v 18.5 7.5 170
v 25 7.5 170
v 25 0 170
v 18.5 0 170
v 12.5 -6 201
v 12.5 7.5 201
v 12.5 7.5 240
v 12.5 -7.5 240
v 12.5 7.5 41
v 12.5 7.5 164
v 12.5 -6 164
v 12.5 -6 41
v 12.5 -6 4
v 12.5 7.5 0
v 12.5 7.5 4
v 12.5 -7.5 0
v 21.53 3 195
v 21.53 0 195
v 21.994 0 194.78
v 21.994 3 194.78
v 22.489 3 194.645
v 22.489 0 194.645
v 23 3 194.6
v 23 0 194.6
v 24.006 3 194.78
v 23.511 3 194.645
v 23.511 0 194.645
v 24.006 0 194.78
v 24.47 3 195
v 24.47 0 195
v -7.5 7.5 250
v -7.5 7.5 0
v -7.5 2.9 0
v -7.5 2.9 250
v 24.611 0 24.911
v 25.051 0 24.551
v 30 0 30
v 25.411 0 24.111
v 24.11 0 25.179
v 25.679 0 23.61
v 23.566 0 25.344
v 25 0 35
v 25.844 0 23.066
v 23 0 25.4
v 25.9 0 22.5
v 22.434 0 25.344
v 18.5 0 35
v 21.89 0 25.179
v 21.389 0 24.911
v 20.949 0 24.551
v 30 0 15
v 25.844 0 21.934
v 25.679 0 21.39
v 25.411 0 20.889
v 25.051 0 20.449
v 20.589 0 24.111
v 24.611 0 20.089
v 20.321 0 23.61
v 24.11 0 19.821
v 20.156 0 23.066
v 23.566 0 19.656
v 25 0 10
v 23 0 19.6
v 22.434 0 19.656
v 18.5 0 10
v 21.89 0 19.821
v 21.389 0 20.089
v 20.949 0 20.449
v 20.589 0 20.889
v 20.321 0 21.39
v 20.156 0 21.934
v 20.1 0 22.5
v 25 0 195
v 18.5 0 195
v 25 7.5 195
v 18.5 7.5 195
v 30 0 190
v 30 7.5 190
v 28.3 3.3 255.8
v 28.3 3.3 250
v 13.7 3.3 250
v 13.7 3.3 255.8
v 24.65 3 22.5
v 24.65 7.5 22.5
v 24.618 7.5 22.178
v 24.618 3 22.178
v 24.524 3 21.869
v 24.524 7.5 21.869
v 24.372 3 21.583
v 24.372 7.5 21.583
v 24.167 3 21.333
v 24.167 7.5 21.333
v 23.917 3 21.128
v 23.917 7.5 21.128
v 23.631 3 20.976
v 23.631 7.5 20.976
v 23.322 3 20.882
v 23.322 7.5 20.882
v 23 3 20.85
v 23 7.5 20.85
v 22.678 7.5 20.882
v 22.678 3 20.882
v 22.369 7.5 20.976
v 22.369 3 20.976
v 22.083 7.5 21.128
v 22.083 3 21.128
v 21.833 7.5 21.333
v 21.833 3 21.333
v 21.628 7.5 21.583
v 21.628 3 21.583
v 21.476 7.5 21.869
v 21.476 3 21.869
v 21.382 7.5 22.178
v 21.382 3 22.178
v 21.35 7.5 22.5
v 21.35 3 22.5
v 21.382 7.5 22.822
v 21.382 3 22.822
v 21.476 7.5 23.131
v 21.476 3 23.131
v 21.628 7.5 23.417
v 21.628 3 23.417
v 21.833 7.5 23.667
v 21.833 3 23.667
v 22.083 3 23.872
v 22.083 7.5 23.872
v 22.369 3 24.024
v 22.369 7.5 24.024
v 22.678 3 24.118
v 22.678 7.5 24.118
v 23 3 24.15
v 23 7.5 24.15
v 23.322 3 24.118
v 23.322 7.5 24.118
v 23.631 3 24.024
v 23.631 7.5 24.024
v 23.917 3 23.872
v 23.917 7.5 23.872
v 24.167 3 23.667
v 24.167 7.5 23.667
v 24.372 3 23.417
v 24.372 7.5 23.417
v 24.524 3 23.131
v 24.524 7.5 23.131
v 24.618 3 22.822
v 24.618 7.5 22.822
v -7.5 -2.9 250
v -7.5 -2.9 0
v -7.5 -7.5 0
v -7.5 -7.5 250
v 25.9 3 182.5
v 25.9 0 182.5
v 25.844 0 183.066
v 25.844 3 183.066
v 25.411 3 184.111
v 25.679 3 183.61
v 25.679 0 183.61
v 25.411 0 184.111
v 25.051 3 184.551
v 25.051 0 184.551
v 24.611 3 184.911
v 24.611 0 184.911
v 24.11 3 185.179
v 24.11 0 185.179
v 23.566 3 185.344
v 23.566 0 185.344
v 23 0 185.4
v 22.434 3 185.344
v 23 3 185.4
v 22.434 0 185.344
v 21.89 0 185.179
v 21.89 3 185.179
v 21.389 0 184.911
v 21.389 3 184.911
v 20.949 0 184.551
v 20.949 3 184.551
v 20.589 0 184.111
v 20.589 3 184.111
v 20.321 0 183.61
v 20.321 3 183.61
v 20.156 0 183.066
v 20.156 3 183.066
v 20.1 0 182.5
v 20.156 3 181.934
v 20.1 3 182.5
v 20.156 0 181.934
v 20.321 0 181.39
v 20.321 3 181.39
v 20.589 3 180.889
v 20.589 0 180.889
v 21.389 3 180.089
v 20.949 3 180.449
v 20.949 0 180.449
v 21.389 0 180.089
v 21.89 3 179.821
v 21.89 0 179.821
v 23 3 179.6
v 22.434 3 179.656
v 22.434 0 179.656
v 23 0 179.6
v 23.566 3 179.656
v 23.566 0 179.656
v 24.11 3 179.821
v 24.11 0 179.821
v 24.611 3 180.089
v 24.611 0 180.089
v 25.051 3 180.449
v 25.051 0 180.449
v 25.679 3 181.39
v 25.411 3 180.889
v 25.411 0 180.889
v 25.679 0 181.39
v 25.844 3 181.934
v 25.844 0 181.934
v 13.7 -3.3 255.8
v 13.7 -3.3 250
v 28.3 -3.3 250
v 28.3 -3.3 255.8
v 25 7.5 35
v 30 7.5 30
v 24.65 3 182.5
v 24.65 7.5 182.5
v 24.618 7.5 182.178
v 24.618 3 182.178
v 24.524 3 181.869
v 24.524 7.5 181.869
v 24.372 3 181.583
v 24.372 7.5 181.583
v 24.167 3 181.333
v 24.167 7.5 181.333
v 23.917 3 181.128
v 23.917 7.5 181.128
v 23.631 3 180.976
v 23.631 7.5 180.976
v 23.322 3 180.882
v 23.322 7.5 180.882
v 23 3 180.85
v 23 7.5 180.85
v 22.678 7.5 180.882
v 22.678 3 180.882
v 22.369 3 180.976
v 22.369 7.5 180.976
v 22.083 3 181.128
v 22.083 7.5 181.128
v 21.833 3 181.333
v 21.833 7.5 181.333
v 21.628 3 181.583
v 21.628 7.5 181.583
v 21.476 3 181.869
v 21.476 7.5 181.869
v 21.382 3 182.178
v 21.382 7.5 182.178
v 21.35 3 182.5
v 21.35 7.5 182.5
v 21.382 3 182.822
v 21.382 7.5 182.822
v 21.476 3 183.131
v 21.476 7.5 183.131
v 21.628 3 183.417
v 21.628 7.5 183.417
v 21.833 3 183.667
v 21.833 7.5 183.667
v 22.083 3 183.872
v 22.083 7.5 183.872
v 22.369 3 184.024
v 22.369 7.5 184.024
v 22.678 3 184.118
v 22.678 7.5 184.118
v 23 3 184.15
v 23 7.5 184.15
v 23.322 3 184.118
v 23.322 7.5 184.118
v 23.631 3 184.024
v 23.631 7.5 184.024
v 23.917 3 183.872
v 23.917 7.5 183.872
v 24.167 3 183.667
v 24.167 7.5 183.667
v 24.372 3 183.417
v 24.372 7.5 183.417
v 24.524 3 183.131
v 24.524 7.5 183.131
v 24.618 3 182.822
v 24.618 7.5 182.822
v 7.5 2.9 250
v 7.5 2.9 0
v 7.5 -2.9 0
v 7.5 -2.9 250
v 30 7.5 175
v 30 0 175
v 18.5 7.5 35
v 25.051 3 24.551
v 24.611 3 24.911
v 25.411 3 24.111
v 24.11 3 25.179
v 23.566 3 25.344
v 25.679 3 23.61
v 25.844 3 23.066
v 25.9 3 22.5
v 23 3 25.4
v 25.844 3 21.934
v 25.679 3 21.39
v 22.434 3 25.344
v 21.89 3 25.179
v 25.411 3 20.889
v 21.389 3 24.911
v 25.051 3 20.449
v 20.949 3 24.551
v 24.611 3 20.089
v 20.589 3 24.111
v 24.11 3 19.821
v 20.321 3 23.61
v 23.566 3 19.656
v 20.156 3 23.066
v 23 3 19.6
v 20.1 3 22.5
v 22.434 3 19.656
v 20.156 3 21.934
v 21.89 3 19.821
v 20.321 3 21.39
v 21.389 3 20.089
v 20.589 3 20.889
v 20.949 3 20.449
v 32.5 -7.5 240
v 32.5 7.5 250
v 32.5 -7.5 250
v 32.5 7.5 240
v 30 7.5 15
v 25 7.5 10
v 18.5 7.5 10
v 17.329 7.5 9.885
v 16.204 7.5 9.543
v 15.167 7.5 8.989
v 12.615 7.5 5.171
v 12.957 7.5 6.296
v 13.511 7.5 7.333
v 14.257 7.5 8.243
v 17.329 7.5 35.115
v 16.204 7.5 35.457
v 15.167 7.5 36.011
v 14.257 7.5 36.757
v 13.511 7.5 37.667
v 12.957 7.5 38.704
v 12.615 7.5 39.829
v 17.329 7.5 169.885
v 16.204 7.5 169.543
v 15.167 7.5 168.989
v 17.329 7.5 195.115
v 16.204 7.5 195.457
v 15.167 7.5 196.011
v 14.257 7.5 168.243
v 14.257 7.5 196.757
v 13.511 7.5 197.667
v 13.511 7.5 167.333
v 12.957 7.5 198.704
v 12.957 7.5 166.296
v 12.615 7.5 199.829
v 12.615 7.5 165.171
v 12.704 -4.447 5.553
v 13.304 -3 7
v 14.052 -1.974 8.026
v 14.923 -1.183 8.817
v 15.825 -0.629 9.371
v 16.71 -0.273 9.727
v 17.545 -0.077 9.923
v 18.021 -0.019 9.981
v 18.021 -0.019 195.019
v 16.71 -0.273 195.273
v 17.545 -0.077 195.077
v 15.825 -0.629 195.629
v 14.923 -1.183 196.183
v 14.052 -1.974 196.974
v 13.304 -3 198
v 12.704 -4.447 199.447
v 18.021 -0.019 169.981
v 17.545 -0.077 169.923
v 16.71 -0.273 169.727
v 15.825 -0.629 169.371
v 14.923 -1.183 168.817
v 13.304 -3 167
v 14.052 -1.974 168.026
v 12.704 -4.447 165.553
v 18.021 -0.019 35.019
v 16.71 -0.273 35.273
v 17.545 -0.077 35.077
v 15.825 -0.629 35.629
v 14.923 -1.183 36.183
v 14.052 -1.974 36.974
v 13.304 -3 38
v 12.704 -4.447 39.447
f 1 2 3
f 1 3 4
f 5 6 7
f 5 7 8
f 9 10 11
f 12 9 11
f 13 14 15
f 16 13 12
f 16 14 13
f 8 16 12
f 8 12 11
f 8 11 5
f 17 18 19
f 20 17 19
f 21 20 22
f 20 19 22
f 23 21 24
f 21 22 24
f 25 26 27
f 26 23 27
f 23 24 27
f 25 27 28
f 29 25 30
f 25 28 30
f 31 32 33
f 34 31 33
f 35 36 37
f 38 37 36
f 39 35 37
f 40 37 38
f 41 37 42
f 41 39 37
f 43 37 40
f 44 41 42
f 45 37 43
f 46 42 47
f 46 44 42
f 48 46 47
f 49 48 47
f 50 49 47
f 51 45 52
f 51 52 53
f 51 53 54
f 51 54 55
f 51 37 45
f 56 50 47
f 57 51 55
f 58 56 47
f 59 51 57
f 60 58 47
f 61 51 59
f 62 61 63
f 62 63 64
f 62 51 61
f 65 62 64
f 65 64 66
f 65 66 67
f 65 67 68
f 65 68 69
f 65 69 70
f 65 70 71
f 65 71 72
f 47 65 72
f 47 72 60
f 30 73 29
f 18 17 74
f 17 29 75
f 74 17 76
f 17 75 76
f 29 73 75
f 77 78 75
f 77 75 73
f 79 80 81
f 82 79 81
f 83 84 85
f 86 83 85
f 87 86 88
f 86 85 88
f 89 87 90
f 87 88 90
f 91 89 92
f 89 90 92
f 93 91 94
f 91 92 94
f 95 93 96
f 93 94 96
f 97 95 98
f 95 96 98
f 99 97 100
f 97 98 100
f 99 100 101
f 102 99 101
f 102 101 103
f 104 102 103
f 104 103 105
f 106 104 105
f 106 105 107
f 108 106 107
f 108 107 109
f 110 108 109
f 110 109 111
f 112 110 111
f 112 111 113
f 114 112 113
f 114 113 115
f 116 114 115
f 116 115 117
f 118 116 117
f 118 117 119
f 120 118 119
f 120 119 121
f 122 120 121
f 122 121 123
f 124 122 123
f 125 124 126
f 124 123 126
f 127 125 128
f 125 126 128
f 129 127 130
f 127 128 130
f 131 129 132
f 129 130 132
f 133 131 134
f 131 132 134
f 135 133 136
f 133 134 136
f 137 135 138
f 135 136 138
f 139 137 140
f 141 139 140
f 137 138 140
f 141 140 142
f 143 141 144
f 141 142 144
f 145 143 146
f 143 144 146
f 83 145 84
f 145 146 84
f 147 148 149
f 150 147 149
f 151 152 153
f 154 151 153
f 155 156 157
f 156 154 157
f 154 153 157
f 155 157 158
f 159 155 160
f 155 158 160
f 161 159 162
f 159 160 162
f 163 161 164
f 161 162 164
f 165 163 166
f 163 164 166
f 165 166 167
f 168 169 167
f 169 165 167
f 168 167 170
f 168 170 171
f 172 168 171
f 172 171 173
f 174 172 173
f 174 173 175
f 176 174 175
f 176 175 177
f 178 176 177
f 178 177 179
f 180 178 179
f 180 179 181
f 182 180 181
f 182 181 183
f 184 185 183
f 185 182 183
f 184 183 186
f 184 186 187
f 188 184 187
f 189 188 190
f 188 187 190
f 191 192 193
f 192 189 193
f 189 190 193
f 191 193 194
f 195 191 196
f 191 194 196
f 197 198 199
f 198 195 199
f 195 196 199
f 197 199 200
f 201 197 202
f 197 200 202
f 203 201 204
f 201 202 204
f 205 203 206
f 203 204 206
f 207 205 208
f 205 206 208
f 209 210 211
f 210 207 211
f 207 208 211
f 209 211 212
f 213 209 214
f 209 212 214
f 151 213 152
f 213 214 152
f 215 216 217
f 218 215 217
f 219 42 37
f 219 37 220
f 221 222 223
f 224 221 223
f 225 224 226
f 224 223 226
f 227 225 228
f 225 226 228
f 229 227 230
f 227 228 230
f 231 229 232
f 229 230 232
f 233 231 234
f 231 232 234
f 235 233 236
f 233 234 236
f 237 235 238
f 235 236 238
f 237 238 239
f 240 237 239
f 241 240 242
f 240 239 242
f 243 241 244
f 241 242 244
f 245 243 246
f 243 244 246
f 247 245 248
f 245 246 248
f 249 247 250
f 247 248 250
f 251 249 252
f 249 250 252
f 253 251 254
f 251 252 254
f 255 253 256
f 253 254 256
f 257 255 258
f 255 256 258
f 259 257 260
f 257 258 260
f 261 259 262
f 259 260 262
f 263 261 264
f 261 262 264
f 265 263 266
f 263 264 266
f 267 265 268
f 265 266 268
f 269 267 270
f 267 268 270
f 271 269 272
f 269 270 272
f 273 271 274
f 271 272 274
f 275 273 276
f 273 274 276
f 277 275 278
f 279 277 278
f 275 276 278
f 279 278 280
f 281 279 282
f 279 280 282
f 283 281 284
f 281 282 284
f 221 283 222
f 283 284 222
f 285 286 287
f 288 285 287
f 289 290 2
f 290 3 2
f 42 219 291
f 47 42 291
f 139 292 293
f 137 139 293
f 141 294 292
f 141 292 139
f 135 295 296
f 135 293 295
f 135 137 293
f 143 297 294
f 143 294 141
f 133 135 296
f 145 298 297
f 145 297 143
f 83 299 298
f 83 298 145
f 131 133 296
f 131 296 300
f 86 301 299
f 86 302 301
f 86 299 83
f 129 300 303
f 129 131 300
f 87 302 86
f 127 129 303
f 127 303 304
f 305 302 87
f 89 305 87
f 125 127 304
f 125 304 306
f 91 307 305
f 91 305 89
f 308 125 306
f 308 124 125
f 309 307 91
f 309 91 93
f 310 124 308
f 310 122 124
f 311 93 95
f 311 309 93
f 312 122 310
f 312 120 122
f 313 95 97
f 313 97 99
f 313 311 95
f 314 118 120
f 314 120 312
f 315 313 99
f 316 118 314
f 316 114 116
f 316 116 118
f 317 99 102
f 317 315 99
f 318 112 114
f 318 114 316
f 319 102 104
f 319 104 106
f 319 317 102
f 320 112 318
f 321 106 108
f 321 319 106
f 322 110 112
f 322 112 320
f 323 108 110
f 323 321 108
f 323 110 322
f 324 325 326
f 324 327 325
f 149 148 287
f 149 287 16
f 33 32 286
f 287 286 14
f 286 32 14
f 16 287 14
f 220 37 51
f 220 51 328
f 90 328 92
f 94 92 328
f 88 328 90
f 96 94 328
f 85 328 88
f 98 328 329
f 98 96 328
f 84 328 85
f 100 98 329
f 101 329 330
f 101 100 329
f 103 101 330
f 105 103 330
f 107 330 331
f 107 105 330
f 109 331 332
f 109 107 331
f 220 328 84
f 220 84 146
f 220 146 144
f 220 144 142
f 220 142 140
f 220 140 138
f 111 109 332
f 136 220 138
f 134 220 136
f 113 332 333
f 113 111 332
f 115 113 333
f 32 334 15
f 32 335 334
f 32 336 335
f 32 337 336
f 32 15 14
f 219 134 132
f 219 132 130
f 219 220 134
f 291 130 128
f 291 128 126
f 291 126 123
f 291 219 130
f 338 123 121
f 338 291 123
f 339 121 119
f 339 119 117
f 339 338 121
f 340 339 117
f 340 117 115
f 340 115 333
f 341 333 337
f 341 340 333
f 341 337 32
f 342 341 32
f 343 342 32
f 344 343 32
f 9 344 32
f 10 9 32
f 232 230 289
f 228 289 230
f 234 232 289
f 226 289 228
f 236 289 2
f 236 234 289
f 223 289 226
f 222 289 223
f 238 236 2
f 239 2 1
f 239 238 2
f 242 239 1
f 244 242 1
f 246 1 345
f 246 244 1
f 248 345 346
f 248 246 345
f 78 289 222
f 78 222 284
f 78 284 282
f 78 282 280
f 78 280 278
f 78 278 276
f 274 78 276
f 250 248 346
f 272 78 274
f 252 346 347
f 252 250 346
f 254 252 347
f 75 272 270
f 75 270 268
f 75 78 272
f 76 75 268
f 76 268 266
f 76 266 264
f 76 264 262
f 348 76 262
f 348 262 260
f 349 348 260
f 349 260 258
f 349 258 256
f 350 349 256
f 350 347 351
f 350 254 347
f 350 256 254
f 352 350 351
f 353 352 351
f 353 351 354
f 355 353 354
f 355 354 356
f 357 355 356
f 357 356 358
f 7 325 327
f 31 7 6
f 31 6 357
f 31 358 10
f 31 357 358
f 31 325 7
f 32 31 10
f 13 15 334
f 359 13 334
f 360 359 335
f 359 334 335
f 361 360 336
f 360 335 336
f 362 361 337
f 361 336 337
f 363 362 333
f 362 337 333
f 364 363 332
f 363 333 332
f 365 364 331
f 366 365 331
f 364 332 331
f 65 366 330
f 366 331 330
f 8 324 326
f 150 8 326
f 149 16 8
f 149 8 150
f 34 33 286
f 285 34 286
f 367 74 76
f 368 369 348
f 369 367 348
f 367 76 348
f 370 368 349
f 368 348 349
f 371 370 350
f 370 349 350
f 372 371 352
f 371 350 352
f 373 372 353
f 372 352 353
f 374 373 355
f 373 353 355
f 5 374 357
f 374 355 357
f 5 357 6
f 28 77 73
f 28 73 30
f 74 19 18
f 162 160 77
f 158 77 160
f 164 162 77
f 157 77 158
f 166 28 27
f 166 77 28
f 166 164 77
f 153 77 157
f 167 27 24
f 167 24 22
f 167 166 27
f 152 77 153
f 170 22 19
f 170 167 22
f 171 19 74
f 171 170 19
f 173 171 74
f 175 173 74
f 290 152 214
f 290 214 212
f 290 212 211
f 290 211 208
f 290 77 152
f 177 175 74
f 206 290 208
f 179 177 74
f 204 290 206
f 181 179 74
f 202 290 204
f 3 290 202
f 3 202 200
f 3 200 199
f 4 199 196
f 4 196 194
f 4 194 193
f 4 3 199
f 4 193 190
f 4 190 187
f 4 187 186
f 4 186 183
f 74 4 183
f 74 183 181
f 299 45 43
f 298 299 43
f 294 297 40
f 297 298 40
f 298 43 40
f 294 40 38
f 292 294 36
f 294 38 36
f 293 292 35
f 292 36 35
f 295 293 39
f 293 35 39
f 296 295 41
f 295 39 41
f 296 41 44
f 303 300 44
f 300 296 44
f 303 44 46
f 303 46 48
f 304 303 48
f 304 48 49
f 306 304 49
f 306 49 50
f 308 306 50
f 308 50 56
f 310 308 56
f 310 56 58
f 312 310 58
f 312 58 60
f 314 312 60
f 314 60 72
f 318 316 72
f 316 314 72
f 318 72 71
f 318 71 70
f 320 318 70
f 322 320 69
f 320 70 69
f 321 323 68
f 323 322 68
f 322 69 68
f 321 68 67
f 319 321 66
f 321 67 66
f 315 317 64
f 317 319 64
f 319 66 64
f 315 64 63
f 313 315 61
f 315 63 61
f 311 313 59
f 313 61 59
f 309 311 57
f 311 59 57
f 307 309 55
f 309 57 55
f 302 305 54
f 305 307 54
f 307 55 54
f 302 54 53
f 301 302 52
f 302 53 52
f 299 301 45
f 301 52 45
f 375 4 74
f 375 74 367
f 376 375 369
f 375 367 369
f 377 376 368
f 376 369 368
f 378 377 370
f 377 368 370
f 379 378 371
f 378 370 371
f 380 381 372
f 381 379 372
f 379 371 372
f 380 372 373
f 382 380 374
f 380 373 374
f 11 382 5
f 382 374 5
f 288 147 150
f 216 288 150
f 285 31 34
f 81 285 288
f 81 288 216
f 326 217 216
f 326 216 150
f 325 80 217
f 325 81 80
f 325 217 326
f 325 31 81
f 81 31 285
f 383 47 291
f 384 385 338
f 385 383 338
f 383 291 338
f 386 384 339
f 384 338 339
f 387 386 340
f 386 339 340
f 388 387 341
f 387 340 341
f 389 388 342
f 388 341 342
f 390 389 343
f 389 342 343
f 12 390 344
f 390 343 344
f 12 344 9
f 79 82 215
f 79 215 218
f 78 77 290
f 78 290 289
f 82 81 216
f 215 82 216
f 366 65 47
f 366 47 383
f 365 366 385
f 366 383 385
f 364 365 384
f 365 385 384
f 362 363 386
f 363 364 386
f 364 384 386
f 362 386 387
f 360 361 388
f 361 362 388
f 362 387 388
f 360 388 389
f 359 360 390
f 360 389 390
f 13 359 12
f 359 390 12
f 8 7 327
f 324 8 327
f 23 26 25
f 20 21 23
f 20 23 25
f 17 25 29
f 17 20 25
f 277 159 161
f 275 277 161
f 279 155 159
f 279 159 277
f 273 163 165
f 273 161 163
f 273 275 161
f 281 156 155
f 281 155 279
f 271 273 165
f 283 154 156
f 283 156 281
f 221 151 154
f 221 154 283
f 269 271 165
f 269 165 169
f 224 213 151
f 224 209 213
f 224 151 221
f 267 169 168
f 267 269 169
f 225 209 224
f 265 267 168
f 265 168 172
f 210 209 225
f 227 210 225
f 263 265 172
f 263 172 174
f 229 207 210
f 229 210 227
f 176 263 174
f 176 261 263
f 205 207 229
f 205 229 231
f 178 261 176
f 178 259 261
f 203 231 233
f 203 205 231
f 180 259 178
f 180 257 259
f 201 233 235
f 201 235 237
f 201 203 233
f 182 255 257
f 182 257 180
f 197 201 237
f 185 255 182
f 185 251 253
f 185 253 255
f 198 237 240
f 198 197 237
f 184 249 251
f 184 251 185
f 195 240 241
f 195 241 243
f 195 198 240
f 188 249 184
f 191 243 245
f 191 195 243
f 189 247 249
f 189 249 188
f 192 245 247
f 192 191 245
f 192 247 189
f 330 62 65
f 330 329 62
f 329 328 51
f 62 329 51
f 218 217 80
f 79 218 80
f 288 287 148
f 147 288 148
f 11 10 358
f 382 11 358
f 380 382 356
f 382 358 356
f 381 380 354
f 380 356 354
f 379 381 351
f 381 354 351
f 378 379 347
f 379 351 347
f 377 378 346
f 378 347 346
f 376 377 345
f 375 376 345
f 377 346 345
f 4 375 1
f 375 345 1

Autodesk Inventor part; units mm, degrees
ref_plane "YZ Plane" through (0, 0, 0) normal (1, 0, 0) x (0, 1, 0)
ref_plane "XZ Plane" through (0, 0, 0) normal (0, 1, 0) x (-1, 0, 0)
sketch "Sketch1" plane through (0, 0, 0) normal (0, 0, 1) x (1, 0, 0)
  line L0 (-7.5, 2.9) -> (7.5, 2.9)
  line L1 (7.5, 2.9) -> (7.5, -2.9)
  line L2 (7.5, -2.9) -> (-7.5, -2.9)
  line L3 (-7.5, -2.9) -> (-7.5, 2.9)
  line L4 (-7.5, 2.9) -> (7.5, -2.9) construction
  line L5 (7.5, 2.9) -> (-7.5, -2.9) construction
  line L6 (-12.5, 7.5) -> (12.5, 7.5)
  line L7 (12.5, 7.5) -> (12.5, -7.5)
  line L8 (12.5, -7.5) -> (-12.5, -7.5)
  line L9 (-12.5, -7.5) -> (-12.5, 7.5)
  line L10 (-12.5, 7.5) -> (12.5, -7.5) construction
  line L11 (12.5, 7.5) -> (-12.5, -7.5) construction
  line L12 (-7.5, 7.5) -> (-7.5, -7.5)
  point P0 (0, 0)
  point P1 (-7.5, 2.9)
  dimension "d0" = 15
  dimension "d1" = 5.8
  dimension "d2" = 25
  dimension "d3" = 15
extrude "Extrusion1" add sketch "Sketch1" along normal blind 500 contours L12 L6 L7 L8 L2 L1 L0
ref_plane "Work Plane1" through (0, 0, 330) normal (0, 0, 1) x (1, 0, 0)
sketch "Sketch2" plane through (0, 0, 330) normal (0, 0, 1) x (1, 0, 0)
  line L0 (-5, 7.5) -> (30, 7.5)
  line L1 (30, 7.5) -> (30, -7.5)
  line L2 (30, -7.5) -> (-5, -7.5)
  line L3 (-5, -7.5) -> (-5, 7.5)
  line L4 (12.5, -7.5) -> (12.5, 7.5)
  line L5 (-5, 7.5) -> (30, -7.5) construction
  line L6 (30, 7.5) -> (-5, -7.5) construction
  line L7 (12.5, 0) -> (30, 0)
  line L8 (30, 0) -> (30, 7.5)
  line L9 (30, 7.5) -> (12.5, 7.5)
  line L10 (12.5, 7.5) -> (12.5, 0)
  line L11 (7.5, -2.9) -> (-7.5, -2.9) projected
  line L12 (-7.5, -2.9) -> (-7.5, -7.5) projected
  line L13 (-7.5, -7.5) -> (12.5, -7.5) projected
  line L14 (12.5, -7.5) -> (12.5, 7.5) projected
  line L15 (12.5, 7.5) -> (-7.5, 7.5) projected
  line L16 (-7.5, 7.5) -> (-7.5, 2.9) projected
  line L17 (-7.5, 2.9) -> (7.5, 2.9) projected
  line L18 (7.5, 2.9) -> (7.5, -2.9) projected
  point P0 (0, 0)
  point P1 (12.5, -6.5)
  point P2 (12.5, 6.5)
  point P3 (12.5, 7.5)
  point P4 (12.5, 6.5)
  point P5 (30, 0)
  dimension "d8" = 35
extrude "Extrusion2" add sketch "Sketch2" against normal blind 25 contours L0 L1 L7 L4
fillet "Fillet2" radius 6 3 edges at (12.5, 3.75, 305) (12.5, 0, 317.5) (12.5, 3.75, 330)
sketch "Sketch4" plane through (-7.5, 7.5, 0) normal (0, 1, 0) x (1, 0, 0)
  line L0 (20, 0) -> (0, 0) projected
  line L1 (0, 0) -> (0, -500) projected
  line L2 (20, -500) -> (0, -500) projected
  line L3 (20, -336) -> (20, -500) projected
  arc A0 (26, -330) -> (20, -336) centre (26, -336) ccw projected
  line L4 (37.5, -330) -> (26, -330) projected
  line L5 (37.5, -330) -> (37.5, -305) projected
  line L6 (26, -305) -> (37.5, -305) projected
  arc A1 (20, -299) -> (26, -305) centre (26, -299) ccw projected
  line L7 (20, 0) -> (20, -299) projected
  circle A2 centre (30.5, -317.5) radius 1.65
  line L8 (20, 0) -> (20, -500) projected
  line L9 (20, -250) -> (51.65, -250)
  circle A3 centre (30.5, -142.5) radius 1.65
  point P0 (7.5, 0)
  point P1 (20, -181)
  point P2 (20, -144)
  point P3 (37.5, -317.5)
  point P4 (37.5, -142.5)
  dimension "d16" = 3.3
  dimension "d17" = 7
extrude "Extrusion4" cut sketch "Sketch4" against normal through all contours A2 | A3
chamfer "Chamfer1" distance 5 angle 45 2 edges at (30, 3.75, 330) (30, 3.75, 305)
sketch "Sketch5" plane through (18.5, 0, 305) normal (0, -1, 0) x (1, 0, 0)
  line L0 (11.5, -170) -> (6.5, -175) projected
  line L1 (11.5, -170) -> (11.5, -155) projected
  line L2 (6.5, -150) -> (11.5, -155) projected
  line L3 (0, -150) -> (6.5, -150) projected
  line L4 (0, -175) -> (0, -150) projected
  line L5 (6.5, -175) -> (0, -175) projected
  circle A0 centre (4.5, -162.5) radius 1.65 projected
  circle A1 centre (4.5, 12.5) radius 1.65 projected
  line L6 (11.5, 5) -> (6.5, 0) projected
  line L7 (11.5, 20) -> (11.5, 5) projected
  line L8 (6.5, 25) -> (11.5, 20) projected
  line L9 (0, 25) -> (6.5, 25) projected
  line L10 (0, 0) -> (0, 25) projected
  line L11 (6.5, 0) -> (0, 0) projected
  circle A2 centre (4.5, 12.5) radius 2.9
  circle A3 centre (4.5, -162.5) radius 2.9
  point P0 (-18.5, -305)
  dimension "d23" = 5.8
extrude "Extrusion5" cut sketch "Sketch5" against normal blind 3 contours A2 | A3
ref_plane "Work Plane3" through (0, 0, 250) normal (0, 0, -1) x (-1, 0, 0)
pattern_linear "Rectangular Pattern1" count 2 spacing 160 along (0, 0, 1) of "Extrusion2", "Fillet2", "Extrusion4", "Chamfer1", "Extrusion5"
mirror "Mirror1" about plane through (0, 0, 250) normal (0, 0, -1) of "Extrusion2", "Fillet2", "Extrusion4", "Chamfer1", "Extrusion5", "Rectangular Pattern1"
ref_plane "Work Plane4" through (0, 0, 250) normal (0, 0, 1) x (1, 0, 0)
sketch "Sketch6" plane through (0, 0, 250) normal (0, 0, 1) x (1, 0, 0)
  line L0 (12.5, 7.5) -> (12.5, -6) projected
  line L1 (12.5, -6) -> (12.5, 7.5) projected
  line L2 (12.5, 7.5) -> (12.5, -6) projected
  line L3 (12.5, -6) -> (12.5, 7.5) projected
  line L4 (12.5, 7.5) -> (12.5, -6) projected
  line L5 (12.5, -6) -> (12.5, 7.5) projected
  line L6 (12.5, 7.5) -> (12.5, -6) projected
  line L7 (12.5, -7.5) -> (12.5, 7.5) projected
  line L8 (12.5, -7.5) -> (12.5, 7.5) projected
  line L9 (12.5, -6) -> (12.5, 7.5) projected
  line L10 (12.5, 7.5) -> (32.5, 7.5)
  line L11 (32.5, 7.5) -> (32.5, -7.5)
  line L12 (32.5, -7.5) -> (12.5, -7.5)
  line L13 (12.5, -7.5) -> (12.5, 7.5)
  point P0 (0, 0)
  dimension "d29" = 20
extrude "Extrusion6" add sketch "Sketch6" along normal mid plane 20
sketch "Sketch7" plane through (0, 0, 250) normal (0, 0, 1) x (1, 0, 0)
  line L0 (-44.2383, 45.2094) -> (125.162, 45.2094)
  line L1 (125.162, 45.2094) -> (125.162, -53.1939)
  line L2 (125.162, -53.1939) -> (-44.2383, -53.1939)
  line L3 (-44.2383, -53.1939) -> (-44.2383, 45.2094)
  point P0 (0, 0)
extrude "Extrusion7" cut sketch "Sketch7" along normal through all
sketch "Sketch8" plane through (0, 0, 250) normal (0, 0, 1) x (1, 0, 0)
  line L0 (7.5, -2.9) -> (7.5, 2.9) projected
  line L1 (-7.5, -2.9) -> (7.5, -2.9) projected
  line L2 (-7.5, -7.5) -> (-7.5, -2.9) projected
  line L3 (32.5, -7.5) -> (-7.5, -7.5) projected
  line L4 (32.5, 7.5) -> (32.5, -7.5) projected
  line L5 (-7.5, 7.5) -> (32.5, 7.5) projected
  line L6 (-7.5, 2.9) -> (-7.5, 7.5) projected
  line L7 (7.5, 2.9) -> (-7.5, 2.9) projected
  line L8 (13.5, 3.5) -> (28.5, 3.5)
  line L9 (28.5, 3.5) -> (28.5, -3.5)
  line L10 (28.5, -3.5) -> (13.5, -3.5)
  line L11 (13.5, -3.5) -> (13.5, 3.5)
  line L12 (28.3, 3.3) -> (13.7, 3.3)
  line L13 (13.7, 3.3) -> (13.7, -3.3)
  line L14 (13.7, -3.3) -> (28.3, -3.3)
  line L15 (28.3, -3.3) -> (28.3, 3.3)
  point P0 (0, 0)
  point P1 (28.5, 0)
  point P2 (32.5, 0)
  dimension "d34" = 15
  dimension "d35" = 4
  dimension "d36" = 7
  dimension "d37" = 0.2
extrude "Extrusion8" add sketch "Sketch8" along normal blind 5.8 contours L15 L14 L13 L12
properties part number "GUIA DE TAPA PRINCIPAL"
